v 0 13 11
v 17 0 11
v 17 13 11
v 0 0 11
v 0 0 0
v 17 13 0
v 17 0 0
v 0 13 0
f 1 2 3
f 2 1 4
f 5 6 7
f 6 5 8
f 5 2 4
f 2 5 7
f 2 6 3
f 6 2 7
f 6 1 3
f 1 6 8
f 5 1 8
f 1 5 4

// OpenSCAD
// Generated by SolidPython 1.0.1 on 2020-07-29 00:46:56


cube(size = [17, 13, 11]);
/***********************************************
*********      SolidPython code:      **********
************************************************
 
# import packages: SolidPython
from solid import *
from solid.utils import *
from itertools import chain, combinations, permutations


class Resize:

    def __init__(self, scad_file):
        self.scad_file = scad_file
        #self.scad_file = import_scad(scad_file)
        # cone/cylinder param:
        self.r1 = 0
        self.r2 = 0
        self.h = 0
        # rectangular prism param:
        self.w = 0
        self.l = 0
        # ellipse param:
        self.r = 0

    # import OpenScad code (file name corresponds to shape)


    # classify shape + parameters
    def assign(self, param1, param2, param3):
        if self.scad_file == 'cone.scad':
            self.r1 = param1
            self.r2 = param2
            self.h = param3
        elif self.scad_file == 'cylinder.scad':
            self.r1 = param1
            self.r2 = param2
            self.h = param3
        elif self.scad_file == 'rectangularPrism.scad':
            self.h = param1
            self.l = param2
            self.w = param3
        else:
            self.r = param1
            self.h = param2

    # resize parameters
    def iterate(self):
        x = range(3, 20, 2)
        i = 1
        if self.scad_file == 'cone.scad':
            tempList = list(permutations(x, 2))
            for temp in tempList:
                param1 = temp[0]
                param2 = temp[1]
                filepath = 'produced_scad_files/' + 'cone' + str(param1) + '_' + str(param2) + '_' + '.scad'
                scad_render_to_file(cylinder(h=param1, r1=param2, r2=0), filepath)

        elif self.scad_file == 'cylinder.scad':
            tempList = list(permutations(x, 3))
            for temp in tempList:
                param1 = temp[0]
                param2 = temp[1]
                filepath = 'produced_scad_files/' + 'cylinder' + str(param1) + '_' + str(param2) + '_' + '.scad'
                scad_render_to_file(cylinder(h=param1, r1=param2, r2=param2), filepath)

        elif self.scad_file == 'rectangularPrism.scad':
            tempList = list(permutations(x, 3))
            for temp in tempList:
                param1 = temp[0]
                param2 = temp[1]
                param3 = temp[2]
                filepath = 'produced_scad_files/' + 'rectangularPrism' + str(param1) + '_' + str(param2) + '_' + str(
                    param3) + '.scad'
                scad_render_to_file(cube(size=(param1, param2, param3)), filepath)

        elif self.scad_file == 'ellipse.scad':
            tempList = list(permutations(x, 4))
            for temp in tempList:
                param1 = temp[0]
                param2 = temp[1]
                param3 = temp[2]
                param4 = temp[3]
                filepath = 'produced_scad_files/' + 'ellipse' + str(param1) + '_' + str(param2) + '_' + str(param3) + '_' + str(param4) + '.scad'
                scad_render_to_file(scale([param1, param2, param3])(sphere(r=param4)), filepath)

    def render_to_scadfile(self):
        scad_render_to_file(scad, 'example.scad') 
 
************************************************/
